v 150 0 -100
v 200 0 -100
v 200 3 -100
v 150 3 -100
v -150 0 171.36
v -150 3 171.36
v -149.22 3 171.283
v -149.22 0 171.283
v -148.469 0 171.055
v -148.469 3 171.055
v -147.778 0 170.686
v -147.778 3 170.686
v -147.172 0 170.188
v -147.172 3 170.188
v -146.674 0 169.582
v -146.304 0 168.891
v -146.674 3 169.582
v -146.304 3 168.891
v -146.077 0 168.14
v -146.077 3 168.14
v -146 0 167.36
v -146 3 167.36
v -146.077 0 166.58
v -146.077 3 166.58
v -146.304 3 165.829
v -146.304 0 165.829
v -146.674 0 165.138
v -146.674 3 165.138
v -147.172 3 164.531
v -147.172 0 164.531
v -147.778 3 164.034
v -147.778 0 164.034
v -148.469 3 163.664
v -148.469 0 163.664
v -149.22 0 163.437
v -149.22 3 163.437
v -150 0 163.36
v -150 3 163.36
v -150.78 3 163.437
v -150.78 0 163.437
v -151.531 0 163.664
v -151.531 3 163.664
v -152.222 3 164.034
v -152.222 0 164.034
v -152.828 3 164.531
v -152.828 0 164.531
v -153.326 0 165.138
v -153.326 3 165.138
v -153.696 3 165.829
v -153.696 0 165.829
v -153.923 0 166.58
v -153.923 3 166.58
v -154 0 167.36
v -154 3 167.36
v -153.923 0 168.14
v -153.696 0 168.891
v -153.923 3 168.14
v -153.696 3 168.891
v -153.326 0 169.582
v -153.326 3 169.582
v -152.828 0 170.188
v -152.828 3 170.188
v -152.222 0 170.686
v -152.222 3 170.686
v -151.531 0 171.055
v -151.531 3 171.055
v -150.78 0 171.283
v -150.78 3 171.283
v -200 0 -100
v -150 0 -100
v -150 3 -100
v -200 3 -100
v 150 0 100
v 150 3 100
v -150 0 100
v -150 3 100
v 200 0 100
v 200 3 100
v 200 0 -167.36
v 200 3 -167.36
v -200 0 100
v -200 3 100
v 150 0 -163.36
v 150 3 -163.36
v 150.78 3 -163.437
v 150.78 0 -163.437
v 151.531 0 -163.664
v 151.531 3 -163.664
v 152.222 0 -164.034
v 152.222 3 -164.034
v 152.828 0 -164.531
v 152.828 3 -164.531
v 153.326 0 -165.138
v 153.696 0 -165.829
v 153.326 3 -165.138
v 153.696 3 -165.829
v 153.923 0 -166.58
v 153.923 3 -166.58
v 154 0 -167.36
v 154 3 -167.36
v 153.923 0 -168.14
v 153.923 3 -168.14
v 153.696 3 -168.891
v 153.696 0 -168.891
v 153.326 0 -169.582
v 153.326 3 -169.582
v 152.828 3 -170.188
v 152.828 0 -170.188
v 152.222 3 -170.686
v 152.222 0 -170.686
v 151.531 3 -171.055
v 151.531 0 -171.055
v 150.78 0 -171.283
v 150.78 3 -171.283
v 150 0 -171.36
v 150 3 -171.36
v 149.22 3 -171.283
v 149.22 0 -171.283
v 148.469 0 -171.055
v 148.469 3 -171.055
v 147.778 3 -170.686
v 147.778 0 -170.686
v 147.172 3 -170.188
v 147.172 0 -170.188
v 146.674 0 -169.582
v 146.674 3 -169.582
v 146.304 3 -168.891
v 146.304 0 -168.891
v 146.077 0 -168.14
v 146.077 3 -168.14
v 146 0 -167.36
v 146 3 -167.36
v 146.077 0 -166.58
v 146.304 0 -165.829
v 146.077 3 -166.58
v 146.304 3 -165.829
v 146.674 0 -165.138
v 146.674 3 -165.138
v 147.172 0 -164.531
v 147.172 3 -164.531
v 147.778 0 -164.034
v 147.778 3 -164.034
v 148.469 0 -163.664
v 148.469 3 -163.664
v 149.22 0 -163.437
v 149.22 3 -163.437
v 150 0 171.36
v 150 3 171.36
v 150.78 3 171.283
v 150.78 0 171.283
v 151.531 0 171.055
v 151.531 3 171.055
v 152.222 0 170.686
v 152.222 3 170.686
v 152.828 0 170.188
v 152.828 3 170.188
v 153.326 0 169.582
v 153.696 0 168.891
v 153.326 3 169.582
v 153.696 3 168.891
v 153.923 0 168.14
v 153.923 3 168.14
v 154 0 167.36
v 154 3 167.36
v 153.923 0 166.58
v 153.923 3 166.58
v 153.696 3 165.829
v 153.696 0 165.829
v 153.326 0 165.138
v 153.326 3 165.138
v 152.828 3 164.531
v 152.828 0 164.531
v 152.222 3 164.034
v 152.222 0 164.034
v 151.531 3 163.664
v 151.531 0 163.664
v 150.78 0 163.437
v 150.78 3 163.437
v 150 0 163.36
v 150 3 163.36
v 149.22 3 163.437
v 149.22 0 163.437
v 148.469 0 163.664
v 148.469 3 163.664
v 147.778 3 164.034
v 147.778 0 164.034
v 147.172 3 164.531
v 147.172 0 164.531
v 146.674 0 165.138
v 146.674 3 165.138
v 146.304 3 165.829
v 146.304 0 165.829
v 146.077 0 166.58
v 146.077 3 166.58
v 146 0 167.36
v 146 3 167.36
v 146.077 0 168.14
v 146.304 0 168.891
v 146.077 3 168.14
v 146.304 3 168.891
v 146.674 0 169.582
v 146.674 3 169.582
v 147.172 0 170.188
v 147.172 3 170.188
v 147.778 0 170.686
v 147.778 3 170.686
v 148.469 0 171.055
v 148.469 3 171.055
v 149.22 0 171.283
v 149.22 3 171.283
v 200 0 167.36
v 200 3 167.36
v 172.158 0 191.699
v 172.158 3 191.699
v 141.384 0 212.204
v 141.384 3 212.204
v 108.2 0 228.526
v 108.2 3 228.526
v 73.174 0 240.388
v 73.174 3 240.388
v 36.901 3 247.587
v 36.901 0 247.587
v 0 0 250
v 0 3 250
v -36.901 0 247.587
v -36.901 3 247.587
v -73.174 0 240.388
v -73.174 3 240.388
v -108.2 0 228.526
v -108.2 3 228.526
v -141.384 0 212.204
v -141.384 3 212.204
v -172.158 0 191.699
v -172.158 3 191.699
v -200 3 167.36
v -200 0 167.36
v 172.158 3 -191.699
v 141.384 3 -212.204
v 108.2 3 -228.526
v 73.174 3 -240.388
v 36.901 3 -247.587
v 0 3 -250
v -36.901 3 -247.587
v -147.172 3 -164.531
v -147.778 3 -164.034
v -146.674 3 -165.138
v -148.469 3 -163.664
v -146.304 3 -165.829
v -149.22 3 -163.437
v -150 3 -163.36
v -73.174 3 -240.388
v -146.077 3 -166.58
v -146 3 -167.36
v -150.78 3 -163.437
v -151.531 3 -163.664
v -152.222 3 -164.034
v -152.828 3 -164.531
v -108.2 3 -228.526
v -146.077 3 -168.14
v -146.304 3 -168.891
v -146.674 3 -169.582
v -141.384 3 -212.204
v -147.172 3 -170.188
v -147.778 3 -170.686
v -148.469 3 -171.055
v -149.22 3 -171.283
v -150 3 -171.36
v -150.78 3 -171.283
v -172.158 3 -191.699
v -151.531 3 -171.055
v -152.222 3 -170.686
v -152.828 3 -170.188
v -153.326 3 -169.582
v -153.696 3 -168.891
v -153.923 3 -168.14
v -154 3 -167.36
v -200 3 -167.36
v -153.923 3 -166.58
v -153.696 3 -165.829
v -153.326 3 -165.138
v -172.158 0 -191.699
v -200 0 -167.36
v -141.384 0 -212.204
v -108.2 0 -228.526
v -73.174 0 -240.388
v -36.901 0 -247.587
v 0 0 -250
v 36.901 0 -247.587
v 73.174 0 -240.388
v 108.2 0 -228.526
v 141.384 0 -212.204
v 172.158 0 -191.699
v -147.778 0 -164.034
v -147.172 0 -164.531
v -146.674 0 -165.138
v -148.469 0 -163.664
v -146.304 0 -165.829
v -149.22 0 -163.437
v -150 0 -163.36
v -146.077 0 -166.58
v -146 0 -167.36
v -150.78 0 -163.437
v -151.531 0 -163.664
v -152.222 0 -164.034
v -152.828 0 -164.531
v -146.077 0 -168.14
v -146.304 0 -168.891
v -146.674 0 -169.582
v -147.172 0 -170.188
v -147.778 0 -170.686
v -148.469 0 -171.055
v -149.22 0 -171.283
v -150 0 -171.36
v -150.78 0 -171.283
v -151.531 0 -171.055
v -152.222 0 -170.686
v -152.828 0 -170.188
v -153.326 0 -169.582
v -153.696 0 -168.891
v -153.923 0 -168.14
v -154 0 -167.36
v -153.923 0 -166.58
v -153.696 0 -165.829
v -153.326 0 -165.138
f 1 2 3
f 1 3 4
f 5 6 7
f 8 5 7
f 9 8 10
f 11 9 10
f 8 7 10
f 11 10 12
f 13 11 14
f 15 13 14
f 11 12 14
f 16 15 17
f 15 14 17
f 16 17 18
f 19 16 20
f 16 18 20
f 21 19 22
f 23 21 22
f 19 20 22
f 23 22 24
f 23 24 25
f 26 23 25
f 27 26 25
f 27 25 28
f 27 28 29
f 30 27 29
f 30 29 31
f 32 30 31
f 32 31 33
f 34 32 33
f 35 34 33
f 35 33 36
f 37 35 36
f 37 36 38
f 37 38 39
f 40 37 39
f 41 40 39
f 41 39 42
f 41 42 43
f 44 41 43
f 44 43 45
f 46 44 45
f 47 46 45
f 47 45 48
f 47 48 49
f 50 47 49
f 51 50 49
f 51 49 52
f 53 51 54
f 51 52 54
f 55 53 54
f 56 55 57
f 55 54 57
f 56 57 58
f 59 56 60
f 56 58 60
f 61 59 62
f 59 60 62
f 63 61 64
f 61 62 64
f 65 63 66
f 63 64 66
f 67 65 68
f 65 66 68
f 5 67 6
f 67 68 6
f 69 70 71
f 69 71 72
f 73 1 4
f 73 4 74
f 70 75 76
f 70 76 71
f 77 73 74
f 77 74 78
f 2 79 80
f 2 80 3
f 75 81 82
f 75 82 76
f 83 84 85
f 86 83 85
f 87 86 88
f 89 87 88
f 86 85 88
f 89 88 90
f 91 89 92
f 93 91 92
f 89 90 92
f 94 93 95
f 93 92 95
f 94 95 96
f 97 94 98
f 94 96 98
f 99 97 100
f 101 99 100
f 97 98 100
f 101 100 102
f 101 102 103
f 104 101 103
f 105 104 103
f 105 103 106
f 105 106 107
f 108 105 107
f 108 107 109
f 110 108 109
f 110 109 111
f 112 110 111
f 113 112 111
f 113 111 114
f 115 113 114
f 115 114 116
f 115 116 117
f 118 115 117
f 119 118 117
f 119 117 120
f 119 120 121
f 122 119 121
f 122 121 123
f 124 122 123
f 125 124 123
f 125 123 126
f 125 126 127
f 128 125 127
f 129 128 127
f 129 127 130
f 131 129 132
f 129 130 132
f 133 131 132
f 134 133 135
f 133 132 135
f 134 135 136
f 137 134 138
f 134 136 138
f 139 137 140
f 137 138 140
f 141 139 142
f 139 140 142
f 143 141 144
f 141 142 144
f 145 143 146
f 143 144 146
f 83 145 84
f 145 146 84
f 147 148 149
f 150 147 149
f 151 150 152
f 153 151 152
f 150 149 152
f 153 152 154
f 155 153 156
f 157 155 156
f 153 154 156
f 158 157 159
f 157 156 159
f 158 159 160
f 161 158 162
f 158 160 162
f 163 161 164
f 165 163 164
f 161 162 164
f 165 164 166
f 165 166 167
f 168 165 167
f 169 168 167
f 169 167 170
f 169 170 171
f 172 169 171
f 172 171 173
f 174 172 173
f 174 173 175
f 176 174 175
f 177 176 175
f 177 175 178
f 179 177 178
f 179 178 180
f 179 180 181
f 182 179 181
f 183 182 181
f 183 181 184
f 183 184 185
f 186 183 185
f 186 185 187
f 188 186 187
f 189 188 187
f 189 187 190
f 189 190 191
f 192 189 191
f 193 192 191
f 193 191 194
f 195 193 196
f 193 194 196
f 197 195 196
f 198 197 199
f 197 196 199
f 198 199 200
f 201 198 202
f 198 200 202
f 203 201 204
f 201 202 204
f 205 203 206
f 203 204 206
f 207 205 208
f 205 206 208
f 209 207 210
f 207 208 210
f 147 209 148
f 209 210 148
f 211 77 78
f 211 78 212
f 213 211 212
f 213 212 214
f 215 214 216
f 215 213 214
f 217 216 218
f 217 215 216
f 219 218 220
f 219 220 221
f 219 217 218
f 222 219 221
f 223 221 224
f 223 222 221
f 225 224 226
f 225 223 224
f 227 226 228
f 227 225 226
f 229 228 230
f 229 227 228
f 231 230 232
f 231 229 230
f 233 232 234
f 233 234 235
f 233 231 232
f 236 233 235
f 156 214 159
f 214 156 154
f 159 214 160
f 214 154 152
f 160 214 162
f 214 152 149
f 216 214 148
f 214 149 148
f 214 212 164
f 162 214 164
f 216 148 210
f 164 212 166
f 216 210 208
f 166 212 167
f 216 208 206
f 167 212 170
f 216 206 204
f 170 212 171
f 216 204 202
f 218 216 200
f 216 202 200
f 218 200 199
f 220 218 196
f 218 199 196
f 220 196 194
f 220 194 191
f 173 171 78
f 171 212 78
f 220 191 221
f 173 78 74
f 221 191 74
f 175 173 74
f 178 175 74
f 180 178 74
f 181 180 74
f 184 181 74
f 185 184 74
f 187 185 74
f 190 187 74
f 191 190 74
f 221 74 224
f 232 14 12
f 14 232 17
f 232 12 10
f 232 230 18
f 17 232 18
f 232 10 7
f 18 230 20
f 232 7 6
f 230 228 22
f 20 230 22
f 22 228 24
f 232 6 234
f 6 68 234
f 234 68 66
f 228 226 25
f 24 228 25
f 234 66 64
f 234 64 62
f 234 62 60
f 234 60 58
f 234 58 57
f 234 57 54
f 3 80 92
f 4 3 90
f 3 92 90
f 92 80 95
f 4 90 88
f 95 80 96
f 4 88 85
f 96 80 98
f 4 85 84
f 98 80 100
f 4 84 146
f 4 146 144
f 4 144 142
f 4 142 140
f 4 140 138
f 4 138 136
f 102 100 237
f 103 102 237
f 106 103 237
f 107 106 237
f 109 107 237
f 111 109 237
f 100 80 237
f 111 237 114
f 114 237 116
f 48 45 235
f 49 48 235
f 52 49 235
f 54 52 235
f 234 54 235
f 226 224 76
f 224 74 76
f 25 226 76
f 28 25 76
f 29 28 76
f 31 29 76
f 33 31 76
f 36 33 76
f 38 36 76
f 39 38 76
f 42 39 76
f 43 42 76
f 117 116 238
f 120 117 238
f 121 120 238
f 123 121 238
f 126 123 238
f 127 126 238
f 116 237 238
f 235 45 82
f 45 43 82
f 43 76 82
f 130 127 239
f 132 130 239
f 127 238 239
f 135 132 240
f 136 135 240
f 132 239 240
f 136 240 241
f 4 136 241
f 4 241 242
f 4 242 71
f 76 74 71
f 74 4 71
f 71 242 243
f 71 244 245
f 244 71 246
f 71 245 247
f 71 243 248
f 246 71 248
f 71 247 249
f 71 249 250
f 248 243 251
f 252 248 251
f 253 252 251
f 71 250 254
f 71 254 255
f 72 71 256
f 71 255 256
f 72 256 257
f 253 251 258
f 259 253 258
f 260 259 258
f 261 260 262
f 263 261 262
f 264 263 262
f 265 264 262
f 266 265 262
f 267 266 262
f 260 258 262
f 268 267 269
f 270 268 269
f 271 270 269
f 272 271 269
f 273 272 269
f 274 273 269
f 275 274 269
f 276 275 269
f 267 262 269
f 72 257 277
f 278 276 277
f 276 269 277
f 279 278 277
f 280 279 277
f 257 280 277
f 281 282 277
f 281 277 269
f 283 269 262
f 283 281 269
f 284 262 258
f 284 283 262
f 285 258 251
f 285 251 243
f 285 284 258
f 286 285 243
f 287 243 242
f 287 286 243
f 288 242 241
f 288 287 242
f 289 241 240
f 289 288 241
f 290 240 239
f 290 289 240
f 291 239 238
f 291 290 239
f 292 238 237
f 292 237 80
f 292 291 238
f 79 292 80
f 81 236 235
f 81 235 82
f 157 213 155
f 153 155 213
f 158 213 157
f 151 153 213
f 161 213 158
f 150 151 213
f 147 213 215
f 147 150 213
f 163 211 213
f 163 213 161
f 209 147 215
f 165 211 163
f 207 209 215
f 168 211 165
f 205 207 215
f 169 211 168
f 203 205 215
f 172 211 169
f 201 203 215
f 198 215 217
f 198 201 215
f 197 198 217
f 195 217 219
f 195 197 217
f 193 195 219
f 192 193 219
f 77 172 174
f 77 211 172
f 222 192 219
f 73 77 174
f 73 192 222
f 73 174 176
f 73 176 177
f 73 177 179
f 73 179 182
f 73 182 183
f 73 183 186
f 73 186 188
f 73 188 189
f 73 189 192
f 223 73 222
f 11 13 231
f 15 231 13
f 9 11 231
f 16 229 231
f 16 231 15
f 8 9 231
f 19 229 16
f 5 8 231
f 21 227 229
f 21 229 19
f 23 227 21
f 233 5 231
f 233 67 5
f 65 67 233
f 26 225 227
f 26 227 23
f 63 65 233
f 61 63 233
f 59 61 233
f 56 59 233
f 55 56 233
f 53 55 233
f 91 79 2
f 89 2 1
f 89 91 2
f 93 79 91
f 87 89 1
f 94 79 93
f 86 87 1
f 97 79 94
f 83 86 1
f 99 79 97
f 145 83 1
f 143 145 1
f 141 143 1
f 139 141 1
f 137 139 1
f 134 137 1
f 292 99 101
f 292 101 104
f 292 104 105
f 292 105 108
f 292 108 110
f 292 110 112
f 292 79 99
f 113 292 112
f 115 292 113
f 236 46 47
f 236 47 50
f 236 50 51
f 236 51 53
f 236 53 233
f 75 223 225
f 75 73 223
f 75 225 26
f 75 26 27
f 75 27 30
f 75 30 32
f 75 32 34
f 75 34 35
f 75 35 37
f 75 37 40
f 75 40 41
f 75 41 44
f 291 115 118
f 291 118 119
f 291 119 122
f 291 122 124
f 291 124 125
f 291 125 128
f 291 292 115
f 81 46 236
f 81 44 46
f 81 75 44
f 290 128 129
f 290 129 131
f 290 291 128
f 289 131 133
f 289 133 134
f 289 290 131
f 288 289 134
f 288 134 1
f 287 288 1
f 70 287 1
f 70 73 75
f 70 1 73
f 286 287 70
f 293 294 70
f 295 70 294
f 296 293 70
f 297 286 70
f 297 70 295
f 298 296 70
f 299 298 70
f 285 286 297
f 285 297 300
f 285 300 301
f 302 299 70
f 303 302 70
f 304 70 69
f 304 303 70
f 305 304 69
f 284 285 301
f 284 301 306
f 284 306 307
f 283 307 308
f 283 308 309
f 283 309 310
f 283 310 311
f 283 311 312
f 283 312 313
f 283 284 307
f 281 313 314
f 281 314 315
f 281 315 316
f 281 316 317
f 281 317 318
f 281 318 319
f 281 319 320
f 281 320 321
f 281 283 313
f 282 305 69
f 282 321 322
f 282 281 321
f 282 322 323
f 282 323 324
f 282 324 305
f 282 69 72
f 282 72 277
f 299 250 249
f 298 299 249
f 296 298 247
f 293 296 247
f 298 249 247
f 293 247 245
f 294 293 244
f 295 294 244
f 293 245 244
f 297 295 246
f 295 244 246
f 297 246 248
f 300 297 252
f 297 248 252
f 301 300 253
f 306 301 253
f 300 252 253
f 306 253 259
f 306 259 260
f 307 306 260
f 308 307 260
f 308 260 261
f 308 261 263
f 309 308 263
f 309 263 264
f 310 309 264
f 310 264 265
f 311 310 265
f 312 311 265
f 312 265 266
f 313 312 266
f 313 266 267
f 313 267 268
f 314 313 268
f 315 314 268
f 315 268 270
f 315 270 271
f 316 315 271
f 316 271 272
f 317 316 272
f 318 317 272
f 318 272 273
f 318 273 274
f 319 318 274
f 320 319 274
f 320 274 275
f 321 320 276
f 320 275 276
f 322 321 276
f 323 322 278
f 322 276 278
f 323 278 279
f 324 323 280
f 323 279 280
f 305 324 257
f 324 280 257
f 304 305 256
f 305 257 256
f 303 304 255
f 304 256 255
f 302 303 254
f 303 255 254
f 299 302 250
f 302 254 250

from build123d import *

# Parameters (mm, degrees)
BOSS_EXTRUDE1_DEPTH = 3
SKETCH4_R           = 4
CUT_EXTRUDE1_DEPTH  = 10


with BuildPart() as part:
    # Sketch3 → Boss-Extrude1 (new body)
    with BuildSketch(Plane(origin=(0, 0, 0), x_dir=(1, 0, 0), z_dir=(0, 1, 0))):
        with BuildLine():
            Line((-150, 100), (-200, 100))
            Line((-200, 100), (-200, 167.359909647))
            ThreePointArc((-200, 167.359909647), (0, 250), (200, 167.359909647))
            Line((200, 167.359909647), (200, 100))
            Line((200, 100), (150, 100))
            Line((150, 100), (150, -100))
            Line((150, -100), (200, -100))
            Line((200, -100), (200, -167.359909647))
            ThreePointArc((200, -167.359909647), (0, -250), (-200, -167.359909647))
            Line((-200, -167.359909647), (-200, -100))
            Line((-200, -100), (-150, -100))
            Line((-150, -100), (-150, 100))
        make_face()
    extrude(amount=BOSS_EXTRUDE1_DEPTH)

    # Sketch4 → Cut-Extrude1 (cut)
    with BuildSketch(Plane(origin=(0, 3, 0), x_dir=(1, 0, 0), z_dir=(0, 1, 0))):
        with Locations(Location((-150, 167.359909647, 0), (0, 0, 270))):
            Circle(SKETCH4_R)
        with Locations(Location((150, 167.359909647, 0), (0, 0, 270))):
            Circle(SKETCH4_R)
        with Locations(Location((150, -167.359909647, 0), (0, 0, 270))):
            Circle(SKETCH4_R)
        with Locations(Location((-150, -167.359909647, 0), (0, 0, 270))):
            Circle(SKETCH4_R)
    extrude(amount=-CUT_EXTRUDE1_DEPTH, mode=Mode.SUBTRACT)


solid = part.part
